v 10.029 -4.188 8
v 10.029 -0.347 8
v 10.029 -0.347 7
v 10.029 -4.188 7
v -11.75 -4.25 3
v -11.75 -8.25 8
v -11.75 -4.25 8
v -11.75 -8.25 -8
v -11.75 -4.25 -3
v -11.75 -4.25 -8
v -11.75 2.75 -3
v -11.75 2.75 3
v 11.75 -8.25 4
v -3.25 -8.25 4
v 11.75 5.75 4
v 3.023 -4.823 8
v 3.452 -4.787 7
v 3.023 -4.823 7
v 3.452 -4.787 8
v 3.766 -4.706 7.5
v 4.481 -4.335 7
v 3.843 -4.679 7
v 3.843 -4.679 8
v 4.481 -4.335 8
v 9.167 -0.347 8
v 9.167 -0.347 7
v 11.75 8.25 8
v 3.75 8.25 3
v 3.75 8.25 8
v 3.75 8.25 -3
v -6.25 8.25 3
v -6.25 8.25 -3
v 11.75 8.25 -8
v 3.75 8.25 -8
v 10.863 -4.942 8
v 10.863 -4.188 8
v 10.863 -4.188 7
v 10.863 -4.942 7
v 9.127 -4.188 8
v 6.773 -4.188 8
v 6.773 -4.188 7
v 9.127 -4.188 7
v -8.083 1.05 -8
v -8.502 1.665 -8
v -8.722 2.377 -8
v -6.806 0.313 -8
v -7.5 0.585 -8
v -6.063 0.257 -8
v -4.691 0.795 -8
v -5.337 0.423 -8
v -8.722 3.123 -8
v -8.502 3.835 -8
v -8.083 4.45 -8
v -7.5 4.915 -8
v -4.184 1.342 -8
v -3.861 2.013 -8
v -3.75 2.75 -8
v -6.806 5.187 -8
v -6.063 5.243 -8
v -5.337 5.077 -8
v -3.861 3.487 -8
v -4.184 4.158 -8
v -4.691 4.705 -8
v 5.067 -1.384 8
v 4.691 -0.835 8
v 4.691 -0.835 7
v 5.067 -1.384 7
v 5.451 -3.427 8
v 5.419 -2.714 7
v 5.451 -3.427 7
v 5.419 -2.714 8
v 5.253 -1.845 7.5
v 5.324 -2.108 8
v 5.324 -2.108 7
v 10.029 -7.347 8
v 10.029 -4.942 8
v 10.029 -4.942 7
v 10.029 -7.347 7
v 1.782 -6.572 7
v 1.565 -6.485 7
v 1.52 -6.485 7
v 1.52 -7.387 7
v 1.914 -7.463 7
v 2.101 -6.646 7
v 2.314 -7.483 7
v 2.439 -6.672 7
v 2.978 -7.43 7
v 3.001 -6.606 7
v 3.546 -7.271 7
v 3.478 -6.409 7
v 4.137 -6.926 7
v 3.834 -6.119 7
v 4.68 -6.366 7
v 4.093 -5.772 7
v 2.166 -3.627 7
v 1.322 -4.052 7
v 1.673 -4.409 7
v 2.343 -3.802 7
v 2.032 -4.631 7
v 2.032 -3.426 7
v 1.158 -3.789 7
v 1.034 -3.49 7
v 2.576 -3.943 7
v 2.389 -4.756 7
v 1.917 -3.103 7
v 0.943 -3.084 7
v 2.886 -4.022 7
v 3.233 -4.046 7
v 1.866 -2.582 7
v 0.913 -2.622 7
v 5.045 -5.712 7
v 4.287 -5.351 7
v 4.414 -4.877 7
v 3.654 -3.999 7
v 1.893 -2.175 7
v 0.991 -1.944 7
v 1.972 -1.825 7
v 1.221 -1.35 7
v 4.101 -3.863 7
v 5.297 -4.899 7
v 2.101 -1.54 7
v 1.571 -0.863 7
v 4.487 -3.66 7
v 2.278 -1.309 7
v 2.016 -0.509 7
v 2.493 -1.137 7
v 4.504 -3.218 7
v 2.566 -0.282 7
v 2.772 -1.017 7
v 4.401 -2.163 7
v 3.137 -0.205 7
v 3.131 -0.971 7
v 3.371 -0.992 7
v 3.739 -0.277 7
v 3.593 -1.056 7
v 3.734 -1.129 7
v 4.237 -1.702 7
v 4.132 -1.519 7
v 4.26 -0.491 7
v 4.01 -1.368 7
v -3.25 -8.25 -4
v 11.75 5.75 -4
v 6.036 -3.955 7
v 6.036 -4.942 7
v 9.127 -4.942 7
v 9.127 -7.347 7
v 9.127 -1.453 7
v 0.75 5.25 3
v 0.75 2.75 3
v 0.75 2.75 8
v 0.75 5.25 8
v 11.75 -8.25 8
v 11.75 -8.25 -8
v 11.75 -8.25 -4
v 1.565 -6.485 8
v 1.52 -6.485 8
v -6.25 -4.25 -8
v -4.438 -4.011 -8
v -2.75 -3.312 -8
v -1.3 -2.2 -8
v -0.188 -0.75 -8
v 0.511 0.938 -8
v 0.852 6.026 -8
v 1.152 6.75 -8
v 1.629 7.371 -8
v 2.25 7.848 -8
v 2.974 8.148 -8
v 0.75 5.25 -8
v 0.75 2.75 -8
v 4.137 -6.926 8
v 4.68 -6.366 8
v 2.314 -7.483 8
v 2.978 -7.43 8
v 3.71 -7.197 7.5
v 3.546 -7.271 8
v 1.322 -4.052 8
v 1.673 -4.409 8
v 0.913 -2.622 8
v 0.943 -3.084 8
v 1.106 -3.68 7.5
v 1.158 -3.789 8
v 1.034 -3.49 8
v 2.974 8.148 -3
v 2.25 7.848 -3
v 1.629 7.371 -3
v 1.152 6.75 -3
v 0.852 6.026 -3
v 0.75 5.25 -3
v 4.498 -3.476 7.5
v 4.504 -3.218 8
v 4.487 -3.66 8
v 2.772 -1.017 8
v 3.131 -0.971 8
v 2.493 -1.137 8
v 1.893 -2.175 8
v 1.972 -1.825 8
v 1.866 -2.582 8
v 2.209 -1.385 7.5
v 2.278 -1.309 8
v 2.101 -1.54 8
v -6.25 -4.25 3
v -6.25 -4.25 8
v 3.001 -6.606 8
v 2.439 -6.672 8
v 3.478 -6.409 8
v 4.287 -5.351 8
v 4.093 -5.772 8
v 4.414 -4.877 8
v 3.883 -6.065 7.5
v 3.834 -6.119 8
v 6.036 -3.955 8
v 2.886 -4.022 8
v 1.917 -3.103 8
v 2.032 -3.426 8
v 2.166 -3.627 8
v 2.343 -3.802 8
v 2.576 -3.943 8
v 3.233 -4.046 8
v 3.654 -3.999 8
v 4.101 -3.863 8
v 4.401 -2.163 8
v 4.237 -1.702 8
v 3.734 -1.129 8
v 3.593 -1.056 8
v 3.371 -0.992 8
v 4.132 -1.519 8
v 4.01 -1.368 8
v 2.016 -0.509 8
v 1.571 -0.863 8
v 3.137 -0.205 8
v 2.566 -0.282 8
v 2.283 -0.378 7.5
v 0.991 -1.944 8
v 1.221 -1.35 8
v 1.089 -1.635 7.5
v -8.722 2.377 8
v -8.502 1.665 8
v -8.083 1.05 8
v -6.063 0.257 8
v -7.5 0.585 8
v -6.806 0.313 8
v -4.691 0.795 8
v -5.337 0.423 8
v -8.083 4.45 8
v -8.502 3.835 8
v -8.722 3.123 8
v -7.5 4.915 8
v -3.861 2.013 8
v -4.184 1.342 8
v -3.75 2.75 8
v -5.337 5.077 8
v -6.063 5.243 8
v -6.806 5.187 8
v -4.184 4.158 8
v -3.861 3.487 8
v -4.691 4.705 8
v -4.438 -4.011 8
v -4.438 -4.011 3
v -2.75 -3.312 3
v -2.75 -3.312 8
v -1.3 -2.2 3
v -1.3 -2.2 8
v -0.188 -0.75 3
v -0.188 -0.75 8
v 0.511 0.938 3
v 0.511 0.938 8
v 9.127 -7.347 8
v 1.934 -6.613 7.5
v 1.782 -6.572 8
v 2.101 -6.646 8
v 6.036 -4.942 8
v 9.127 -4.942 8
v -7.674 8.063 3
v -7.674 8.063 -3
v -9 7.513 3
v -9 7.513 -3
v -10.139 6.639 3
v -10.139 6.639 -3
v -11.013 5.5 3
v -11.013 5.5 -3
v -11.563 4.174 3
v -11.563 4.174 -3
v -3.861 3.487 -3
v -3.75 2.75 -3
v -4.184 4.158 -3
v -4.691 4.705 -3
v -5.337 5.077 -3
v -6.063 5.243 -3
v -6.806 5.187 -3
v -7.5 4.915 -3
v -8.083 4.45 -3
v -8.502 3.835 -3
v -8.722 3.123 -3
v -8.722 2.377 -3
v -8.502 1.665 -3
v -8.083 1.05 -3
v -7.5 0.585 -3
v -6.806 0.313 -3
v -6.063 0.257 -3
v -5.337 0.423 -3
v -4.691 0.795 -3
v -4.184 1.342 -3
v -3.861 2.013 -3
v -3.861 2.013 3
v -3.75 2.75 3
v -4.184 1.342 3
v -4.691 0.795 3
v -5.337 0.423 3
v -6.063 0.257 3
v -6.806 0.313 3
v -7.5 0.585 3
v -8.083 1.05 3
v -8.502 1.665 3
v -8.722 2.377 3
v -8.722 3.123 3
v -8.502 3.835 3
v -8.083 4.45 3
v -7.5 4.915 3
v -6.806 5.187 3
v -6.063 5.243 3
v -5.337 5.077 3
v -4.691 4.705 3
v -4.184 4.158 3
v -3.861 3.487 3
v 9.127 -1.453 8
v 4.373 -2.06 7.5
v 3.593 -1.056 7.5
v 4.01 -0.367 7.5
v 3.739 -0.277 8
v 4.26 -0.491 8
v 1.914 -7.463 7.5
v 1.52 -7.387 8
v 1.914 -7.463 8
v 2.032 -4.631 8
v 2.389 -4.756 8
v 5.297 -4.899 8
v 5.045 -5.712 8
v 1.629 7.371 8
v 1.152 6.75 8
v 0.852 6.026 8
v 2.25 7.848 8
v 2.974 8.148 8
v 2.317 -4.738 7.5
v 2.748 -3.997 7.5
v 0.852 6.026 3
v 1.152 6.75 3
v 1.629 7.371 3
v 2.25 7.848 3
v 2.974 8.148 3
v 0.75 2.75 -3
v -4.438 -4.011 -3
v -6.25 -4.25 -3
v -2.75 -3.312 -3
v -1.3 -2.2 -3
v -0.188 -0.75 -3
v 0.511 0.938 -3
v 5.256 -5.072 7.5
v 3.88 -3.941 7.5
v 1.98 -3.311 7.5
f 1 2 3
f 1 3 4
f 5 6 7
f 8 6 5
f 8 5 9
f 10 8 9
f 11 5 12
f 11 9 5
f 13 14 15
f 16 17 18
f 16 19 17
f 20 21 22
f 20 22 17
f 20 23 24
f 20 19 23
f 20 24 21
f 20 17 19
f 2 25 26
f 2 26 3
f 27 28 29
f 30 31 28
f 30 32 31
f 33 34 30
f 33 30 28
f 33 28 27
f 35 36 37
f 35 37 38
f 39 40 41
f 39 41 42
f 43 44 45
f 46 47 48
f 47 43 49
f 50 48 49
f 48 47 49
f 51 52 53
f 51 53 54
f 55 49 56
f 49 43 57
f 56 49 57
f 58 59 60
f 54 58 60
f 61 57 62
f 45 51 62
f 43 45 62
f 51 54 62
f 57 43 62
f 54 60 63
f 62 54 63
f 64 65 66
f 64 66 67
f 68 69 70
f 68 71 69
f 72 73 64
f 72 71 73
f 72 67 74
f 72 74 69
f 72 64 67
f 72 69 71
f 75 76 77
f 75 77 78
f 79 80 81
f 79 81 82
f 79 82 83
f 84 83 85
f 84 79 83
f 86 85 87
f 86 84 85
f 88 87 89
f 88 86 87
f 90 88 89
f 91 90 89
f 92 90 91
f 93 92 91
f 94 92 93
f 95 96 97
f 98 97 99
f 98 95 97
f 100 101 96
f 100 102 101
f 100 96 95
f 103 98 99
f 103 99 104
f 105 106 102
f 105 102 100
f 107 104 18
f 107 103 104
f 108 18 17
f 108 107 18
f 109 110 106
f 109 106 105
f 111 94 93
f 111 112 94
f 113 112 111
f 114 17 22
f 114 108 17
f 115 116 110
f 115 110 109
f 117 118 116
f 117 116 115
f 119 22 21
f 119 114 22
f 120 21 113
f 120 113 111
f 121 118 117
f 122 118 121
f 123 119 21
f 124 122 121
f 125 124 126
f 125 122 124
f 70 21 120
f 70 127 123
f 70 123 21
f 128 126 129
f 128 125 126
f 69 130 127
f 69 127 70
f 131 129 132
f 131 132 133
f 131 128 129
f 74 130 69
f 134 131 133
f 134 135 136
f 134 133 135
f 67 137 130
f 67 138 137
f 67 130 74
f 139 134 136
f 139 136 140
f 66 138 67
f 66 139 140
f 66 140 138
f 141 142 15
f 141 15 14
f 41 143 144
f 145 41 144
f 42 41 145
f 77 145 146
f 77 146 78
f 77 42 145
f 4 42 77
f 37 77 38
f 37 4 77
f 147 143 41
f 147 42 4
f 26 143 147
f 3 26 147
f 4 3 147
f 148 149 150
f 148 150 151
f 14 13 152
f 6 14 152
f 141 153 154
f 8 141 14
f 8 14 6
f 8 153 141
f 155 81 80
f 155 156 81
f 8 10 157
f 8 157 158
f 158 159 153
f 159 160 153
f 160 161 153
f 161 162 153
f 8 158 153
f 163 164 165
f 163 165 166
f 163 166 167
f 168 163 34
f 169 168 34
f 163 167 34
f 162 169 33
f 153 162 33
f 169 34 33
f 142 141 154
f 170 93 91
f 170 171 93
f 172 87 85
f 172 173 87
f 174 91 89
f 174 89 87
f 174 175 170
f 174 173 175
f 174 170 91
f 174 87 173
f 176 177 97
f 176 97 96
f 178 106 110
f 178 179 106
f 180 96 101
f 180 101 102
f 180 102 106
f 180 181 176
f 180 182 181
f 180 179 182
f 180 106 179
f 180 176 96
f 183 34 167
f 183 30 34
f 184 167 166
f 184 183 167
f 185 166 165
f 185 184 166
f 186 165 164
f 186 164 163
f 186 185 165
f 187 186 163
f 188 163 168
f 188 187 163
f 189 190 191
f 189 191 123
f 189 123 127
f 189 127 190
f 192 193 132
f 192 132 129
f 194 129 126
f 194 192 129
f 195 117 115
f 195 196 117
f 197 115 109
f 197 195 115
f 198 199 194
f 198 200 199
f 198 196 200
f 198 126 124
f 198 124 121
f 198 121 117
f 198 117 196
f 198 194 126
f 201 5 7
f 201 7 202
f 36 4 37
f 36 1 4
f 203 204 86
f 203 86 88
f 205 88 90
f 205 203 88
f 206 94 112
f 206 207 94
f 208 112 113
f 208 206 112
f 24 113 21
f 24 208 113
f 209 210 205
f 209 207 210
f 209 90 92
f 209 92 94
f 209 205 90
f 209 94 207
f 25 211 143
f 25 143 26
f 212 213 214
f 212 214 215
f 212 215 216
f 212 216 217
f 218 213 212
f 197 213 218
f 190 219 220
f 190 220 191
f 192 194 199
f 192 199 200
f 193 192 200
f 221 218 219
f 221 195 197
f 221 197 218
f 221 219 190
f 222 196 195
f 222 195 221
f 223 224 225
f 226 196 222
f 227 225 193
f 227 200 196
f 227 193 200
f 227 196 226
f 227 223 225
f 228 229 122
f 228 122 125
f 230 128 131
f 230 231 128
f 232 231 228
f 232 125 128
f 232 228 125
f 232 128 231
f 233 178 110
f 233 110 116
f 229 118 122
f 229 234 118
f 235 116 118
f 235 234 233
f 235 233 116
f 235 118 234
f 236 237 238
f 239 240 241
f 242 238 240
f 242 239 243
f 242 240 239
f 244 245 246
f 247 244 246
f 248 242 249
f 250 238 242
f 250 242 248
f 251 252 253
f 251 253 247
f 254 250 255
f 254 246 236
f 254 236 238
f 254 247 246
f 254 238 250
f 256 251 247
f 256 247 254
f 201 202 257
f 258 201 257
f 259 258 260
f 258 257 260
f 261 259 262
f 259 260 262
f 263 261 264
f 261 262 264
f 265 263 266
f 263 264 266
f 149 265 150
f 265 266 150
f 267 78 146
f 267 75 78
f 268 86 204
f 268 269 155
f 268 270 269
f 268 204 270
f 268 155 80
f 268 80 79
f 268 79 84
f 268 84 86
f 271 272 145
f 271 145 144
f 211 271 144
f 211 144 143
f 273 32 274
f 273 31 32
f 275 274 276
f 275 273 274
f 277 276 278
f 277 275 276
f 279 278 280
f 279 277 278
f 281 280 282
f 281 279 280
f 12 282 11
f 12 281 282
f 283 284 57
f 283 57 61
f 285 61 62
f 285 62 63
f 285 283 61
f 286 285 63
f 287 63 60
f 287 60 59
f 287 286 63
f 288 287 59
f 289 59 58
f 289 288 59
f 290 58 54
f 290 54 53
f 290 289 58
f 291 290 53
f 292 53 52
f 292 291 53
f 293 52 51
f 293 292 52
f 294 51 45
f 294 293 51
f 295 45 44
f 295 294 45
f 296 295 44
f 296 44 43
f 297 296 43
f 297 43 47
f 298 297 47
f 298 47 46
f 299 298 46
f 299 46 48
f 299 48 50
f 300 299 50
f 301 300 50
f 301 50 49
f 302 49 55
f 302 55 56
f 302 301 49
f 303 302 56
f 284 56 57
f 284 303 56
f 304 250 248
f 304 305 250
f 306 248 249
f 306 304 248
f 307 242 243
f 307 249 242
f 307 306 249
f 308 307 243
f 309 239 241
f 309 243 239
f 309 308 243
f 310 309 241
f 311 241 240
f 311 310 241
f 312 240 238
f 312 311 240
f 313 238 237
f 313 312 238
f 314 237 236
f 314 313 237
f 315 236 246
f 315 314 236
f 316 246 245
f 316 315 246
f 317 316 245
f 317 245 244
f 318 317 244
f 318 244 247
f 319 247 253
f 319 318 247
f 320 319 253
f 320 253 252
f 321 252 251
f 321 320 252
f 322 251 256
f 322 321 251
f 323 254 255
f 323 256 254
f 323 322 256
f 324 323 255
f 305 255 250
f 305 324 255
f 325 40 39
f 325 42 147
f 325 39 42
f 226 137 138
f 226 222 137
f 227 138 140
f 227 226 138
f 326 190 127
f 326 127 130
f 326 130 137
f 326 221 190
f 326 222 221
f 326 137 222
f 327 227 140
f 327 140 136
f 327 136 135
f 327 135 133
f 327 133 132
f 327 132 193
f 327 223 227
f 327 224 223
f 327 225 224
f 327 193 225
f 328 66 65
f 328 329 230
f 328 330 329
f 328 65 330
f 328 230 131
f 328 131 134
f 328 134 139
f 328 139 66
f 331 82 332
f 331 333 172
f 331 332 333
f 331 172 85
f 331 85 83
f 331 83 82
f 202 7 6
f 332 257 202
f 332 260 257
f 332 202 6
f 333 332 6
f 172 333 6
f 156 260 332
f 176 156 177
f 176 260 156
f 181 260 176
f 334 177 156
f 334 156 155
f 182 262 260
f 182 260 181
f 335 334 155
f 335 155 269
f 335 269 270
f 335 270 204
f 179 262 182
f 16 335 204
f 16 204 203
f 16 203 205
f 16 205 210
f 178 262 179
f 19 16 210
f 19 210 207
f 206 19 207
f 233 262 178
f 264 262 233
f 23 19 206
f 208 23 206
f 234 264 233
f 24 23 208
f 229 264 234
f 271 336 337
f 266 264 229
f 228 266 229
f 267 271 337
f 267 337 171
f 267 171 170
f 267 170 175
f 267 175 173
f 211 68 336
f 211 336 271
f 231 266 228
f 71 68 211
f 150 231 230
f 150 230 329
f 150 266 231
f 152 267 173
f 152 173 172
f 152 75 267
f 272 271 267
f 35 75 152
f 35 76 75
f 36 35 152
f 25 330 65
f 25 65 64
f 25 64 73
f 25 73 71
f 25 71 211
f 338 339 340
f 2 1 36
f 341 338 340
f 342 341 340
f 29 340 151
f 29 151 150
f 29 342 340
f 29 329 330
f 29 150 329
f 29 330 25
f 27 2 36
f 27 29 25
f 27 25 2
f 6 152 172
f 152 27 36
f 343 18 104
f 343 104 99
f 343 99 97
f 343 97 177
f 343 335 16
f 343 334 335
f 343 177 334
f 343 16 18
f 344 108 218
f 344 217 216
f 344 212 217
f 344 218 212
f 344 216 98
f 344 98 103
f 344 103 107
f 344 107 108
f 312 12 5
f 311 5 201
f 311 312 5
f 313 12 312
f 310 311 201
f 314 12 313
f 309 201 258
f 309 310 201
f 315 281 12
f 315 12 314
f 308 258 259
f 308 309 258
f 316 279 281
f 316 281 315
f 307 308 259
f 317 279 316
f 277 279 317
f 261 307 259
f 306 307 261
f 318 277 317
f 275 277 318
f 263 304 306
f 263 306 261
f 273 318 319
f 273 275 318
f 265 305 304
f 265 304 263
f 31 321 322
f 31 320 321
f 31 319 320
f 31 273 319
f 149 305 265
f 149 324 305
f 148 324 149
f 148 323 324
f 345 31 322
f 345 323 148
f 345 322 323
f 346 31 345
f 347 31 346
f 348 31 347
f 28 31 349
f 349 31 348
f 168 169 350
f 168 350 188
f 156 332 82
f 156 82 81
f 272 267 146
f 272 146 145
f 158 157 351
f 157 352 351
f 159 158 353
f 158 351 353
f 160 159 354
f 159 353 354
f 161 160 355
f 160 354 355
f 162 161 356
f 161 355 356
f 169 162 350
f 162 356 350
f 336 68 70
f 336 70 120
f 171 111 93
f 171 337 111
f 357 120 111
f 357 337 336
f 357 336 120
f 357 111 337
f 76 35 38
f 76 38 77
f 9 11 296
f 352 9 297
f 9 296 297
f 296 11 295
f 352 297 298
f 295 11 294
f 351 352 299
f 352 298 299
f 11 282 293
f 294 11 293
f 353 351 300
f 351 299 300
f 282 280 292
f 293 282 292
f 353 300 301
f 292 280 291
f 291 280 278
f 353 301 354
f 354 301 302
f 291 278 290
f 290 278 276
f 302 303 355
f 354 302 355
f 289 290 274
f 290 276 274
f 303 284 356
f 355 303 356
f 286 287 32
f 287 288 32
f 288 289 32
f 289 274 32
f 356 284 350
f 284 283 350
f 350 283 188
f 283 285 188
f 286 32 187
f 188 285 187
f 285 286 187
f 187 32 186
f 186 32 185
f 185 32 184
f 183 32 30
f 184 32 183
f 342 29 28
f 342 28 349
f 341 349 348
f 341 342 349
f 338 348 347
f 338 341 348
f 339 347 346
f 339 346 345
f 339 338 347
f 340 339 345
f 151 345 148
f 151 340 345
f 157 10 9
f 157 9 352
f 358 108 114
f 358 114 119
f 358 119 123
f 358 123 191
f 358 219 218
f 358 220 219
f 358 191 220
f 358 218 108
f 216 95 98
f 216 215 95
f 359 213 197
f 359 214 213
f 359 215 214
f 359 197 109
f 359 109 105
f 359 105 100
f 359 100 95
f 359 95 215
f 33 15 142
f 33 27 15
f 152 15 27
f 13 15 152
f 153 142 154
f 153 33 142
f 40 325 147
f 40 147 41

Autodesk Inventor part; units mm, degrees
ref_plane "YZ Plane" through (0, 0, 0) normal (1, 0, 0) x (0, 1, 0)
ref_plane "XZ Plane" through (0, 0, 0) normal (0, 1, 0) x (-1, 0, 0)
ref_plane "XY Plane" through (0, 0, 0) normal (0, 0, 1) x (1, 0, 0)
sketch "스케치1" plane through (0, 0, 0) normal (0, 0, 1) x (1, 0, 0)
  line L0 (-11.75, 8.25) -> (11.75, 8.25)
  line L1 (11.75, 8.25) -> (11.75, -8.25)
  line L2 (11.75, -8.25) -> (-11.75, -8.25)
  line L3 (-11.75, -8.25) -> (-11.75, 8.25)
  line L4 (-11.75, 8.25) -> (11.75, -8.25) construction
  line L5 (11.75, 8.25) -> (-11.75, -8.25) construction
  line L6 (-11.75, -4.25) -> (0.75, -4.25)
  line L7 (0.75, -4.25) -> (0.75, 8.25)
  circle A0 centre (-6.25, 2.75) radius 2.5
  point P0 (0, 0)
  dimension "d0" = 23.5
  dimension "d1" = 16.5
  dimension "d3" = 4
  dimension "d4" = 12.5
  dimension "d5" = 5
  dimension "d6" = 11
  dimension "d7" = 18
extrude "돌출1" add sketch "스케치1" along normal mid plane 16 contours L0 L1 L2 L3 L6 L7 | A0
extrude "돌출2" add sketch "스케치1" along normal mid plane 6 contours L0 L7 L6 L3
ref_plane "작업 평면1" through (0, 0, 0) normal (0, 0, 1) x (1, 0, 0)
sketch "스케치2" plane through (0, 0, 0) normal (0, 0, 1) x (1, 0, 0)
  line L0 (11.75, 8.25) -> (11.75, -8.25) projected
  line L1 (11.75, 5.75) -> (-3.25, -8.25)
  line L2 (-11.75, -8.25) -> (-11.75, -4.25) projected
  line L3 (11.75, -8.25) -> (-11.75, -8.25) projected
  point P0 (0, 0)
  dimension "d12" = 2.5
  dimension "d13" = 8.5
  dimension "d14" = 0
extrude "돌출3" cut sketch "스케치2" along normal mid plane 8
fillet "모깎기1" radius 3 2 edges at (0.75, 8.25, 5.5) (0.75, 8.25, -5.5)
fillet "모깎기2" radius 5.5 1 edges at (-11.75, 8.25, 0)
fillet "모깎기3" radius 7 2 edges at (0.75, -4.25, 5.5) (0.75, -4.25, -5.5)
sketch "스케치3" plane through (0, 0, 8) normal (0, 0, 1) x (1, 0, 0)
  line L0 (0.5954, -0.2053) -> (15.6035, -0.2053) construction
  line L1 (15.6035, -0.2053) -> (15.6035, -10.6024) construction
  line L2 (15.6035, -10.6024) -> (0.5954, -10.6024) construction
  line L3 (0.5954, -10.6024) -> (0.5954, -0.2053) construction
  spline S0 degree 2 poles (0.9131, -2.6219) (0.9131, -2.083) (1.2648, -1.1867) (1.5711, -0.8633) knots 0 0 0 1 2 2 2
  spline S1 degree 2 poles (1.5711, -0.8633) (1.8604, -0.5513) (2.7056, -0.2053) (3.1368, -0.2053) knots 0 0 0 1 2 2 2
  spline S2 degree 2 poles (3.1368, -0.2053) (3.6189, -0.2053) (4.4017, -0.5287) (4.691, -0.835) knots 0 0 0 1 2 2 2
  spline S3 degree 2 poles (4.691, -0.835) (5.0541, -1.2207) (5.4512, -2.4687) (5.4512, -3.4274) knots 0 0 0 1 2 2 2
  spline S4 degree 2 poles (5.4512, -3.4274) (5.4512, -4.2953) (5.0598, -5.8496) (4.6797, -6.3658) knots 0 0 0 1 2 2 2
  spline S5 degree 2 poles (4.6797, -6.3658) (4.2769, -6.9103) (3.1424, -7.4833) (2.3142, -7.4833) knots 0 0 0 1 2 2 2
  spline S6 degree 2 poles (2.3142, -7.4833) (2.127, -7.4833) (1.7016, -7.4436) (1.5201, -7.3868) knots 0 0 0 1 2 2 2
  line L4 (1.5201, -7.3868) -> (1.5201, -6.4849)
  line L5 (1.5201, -6.4849) -> (1.5654, -6.4849)
  spline S7 degree 2 poles (1.5654, -6.4849) (1.6846, -6.553) (2.1838, -6.6721) (2.439, -6.6721) knots 0 0 0 1 2 2 2
  spline S8 degree 2 poles (2.439, -6.6721) (3.358, -6.6721) (4.4074, -5.4582) (4.4812, -4.335) knots 0 0 0 1 2 2 2
  spline S9 degree 2 poles (4.4812, -4.335) (4.1068, -4.5902) (3.4261, -4.8228) (3.0233, -4.8228) knots 0 0 0 1 2 2 2
  spline S10 degree 2 poles (3.0233, -4.8228) (2.6376, -4.8228) (1.9966, -4.6526) (1.6732, -4.4087) knots 0 0 0 1 2 2 2
  spline S11 degree 2 poles (1.6732, -4.4087) (1.2988, -4.1194) (0.9131, -3.2402) (0.9131, -2.6219) knots 0 0 0 1 2 2 2
  spline S12 degree 2 poles (4.5039, -3.2175) (4.5039, -2.5084) (4.2429, -1.6121) (4.0103, -1.3682) knots 0 0 0 1 2 2 2
  spline S13 degree 2 poles (4.0103, -1.3682) (3.8061, -1.1413) (3.3807, -0.9711) (3.1311, -0.9711) knots 0 0 0 1 2 2 2
  spline S14 degree 2 poles (3.1311, -0.9711) (2.5525, -0.9711) (1.8661, -1.7993) (1.8661, -2.5821) knots 0 0 0 1 2 2 2
  spline S15 degree 2 poles (1.8661, -2.5821) (1.8661, -3.0246) (2.093, -3.5975) (2.3426, -3.8018) knots 0 0 0 1 2 2 2
  spline S16 degree 2 poles (2.3426, -3.8018) (2.5241, -3.9492) (2.9722, -4.0457) (3.2332, -4.0457) knots 0 0 0 1 2 2 2
  spline S17 degree 2 poles (3.2332, -4.0457) (3.5338, -4.0457) (4.2259, -3.8358) (4.4868, -3.6599) knots 0 0 0 1 2 2 2
  spline S18 degree 2 poles (4.4868, -3.6599) (4.4925, -3.5919) (4.5039, -3.3593) (4.5039, -3.2175) knots 0 0 0 1 2 2 2
  line L6 (10.8628, -4.9419) -> (10.029, -4.9419)
  line L7 (10.029, -4.9419) -> (10.029, -7.3471)
  line L8 (10.029, -7.3471) -> (9.127, -7.3471)
  line L9 (9.127, -7.3471) -> (9.127, -4.9419)
  line L10 (9.127, -4.9419) -> (6.0355, -4.9419)
  line L11 (6.0355, -4.9419) -> (6.0355, -3.9549)
  line L12 (6.0355, -3.9549) -> (9.1667, -0.3471)
  line L13 (9.1667, -0.3471) -> (10.029, -0.3471)
  line L14 (10.029, -0.3471) -> (10.029, -4.1875)
  line L15 (10.029, -4.1875) -> (10.8628, -4.1875)
  line L16 (10.8628, -4.1875) -> (10.8628, -4.9419)
  line L17 (9.127, -4.1875) -> (9.127, -1.4533)
  line L18 (9.127, -1.4533) -> (6.7729, -4.1875)
  line L19 (6.7729, -4.1875) -> (9.127, -4.1875)
  point P0 (0, 0)
extrude "돌출4" cut sketch "스케치3" against normal blind 1
properties part number "1번부품"
